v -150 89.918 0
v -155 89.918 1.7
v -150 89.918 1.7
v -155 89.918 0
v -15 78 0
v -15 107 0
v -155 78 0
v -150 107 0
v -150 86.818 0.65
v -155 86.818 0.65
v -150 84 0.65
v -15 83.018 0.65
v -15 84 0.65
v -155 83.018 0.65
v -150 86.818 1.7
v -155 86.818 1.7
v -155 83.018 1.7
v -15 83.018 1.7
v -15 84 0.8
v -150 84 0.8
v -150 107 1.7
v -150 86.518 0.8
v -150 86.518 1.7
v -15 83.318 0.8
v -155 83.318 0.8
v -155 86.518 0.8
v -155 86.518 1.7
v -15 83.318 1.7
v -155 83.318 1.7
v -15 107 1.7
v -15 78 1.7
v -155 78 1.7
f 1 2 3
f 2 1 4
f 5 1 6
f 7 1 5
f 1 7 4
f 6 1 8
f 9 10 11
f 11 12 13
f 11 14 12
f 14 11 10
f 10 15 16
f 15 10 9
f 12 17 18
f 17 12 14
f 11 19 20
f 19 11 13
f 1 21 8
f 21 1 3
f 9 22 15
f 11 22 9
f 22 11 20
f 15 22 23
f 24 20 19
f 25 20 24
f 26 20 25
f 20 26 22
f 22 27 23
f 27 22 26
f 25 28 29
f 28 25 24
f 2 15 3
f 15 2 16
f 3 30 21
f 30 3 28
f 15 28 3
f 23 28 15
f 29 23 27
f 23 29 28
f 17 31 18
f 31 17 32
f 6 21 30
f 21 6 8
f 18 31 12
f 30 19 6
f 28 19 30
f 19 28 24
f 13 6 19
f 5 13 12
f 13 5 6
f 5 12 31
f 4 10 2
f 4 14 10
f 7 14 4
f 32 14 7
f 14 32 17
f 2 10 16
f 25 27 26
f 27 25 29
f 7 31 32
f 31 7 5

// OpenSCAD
// file: ../../lib/project/util.scad
// lib/project/util.scad

module rounded_rect_2d(size = [10, 10], r = 2) {
  x = size[0];
  y = size[1];
  rr = min(r, min(x, y) / 2);

  hull() {
    for (sx = [-1, 1], sy = [-1, 1]) {
      translate([sx * (x / 2 - rr), sy * (y / 2 - rr)])
        circle(r = rr);
    }
  }
}
// file: ../../lib/project/params.scad
// lib/project/params.scad
// Shared project parameters for the final tray and all fit-test models.

debug = false;

// Main tray footprint.
tray_corner_r = 15;

// Top tray shell.
tray_floor_t = 2.4;
tray_wall_h = 14;
top_wall_w = 10;
glue_rabbet_h = 1.6;
glue_rabbet_w = 3.2;
glue_rabbet_side_clearance = 0.3;
glue_rabbet_vertical_clearance = 0.5;

// Underside support lip and rear support section.
support_lip_drop = 15;
support_lip_w = 10;
front_lip_forward_shift = 2;
front_lip_back_extra = 5;
front_lip_bottom_back_extra = 0;
side_lip_inner_extra = 2.5;
side_lip_bottom_inner_extra = 0;
console_clear_w = 320;
side_lip_run = 170;
tray_w = console_clear_w + 2 * support_lip_w;
tray_d = side_lip_run + support_lip_w;
front_extension = 35;
rear_gap_w = 28;
rear_tongue_side_margin = 20;
rear_tongue_w = tray_w - 2 * rear_tongue_side_margin;
rear_tongue_depth = 34;
rear_tongue_t = 4.0;

// Cup holder location and plug geometry.
cup_spacing = 135;
// Confirmed from fit checks: move plugs 39 mm rearward from the prior position.
cup_y_from_front = 111;
plug_top_d = 90;
plug_bottom_d = 78;
plug_h = 71;
plug_shell_t = 1.6;
plug_clearance_z = 0;
cup_rim_w = 7;
cup_rim_h = 5;

// Optional underside splice plate for joining printed tray halves.
splice_plate_enable = true;
splice_plate_w = 120;
splice_plate_d = 18;
splice_plate_t = 2;
splice_plate_corner_r = 3;
splice_plate_y_from_front = 40;
splice_plate_side_clearance = 0.3;
splice_plate_vertical_clearance = 0.5;
rear_splice_plate_enable = true;
rear_splice_plate_y_from_front = 184;

// Fit-test defaults.
test_plug_top_ds = [84, 85, 86];
test_spacing_values = [116, 118, 120];
test_lip_drop_values = [8, 10, 12];
test_rear_tongue_ts = [1.4, 1.8, 2.2];
test_frame_wall_w = 12;
test_front_zone_depth = 100;
test_rear_zone_depth = 56;
test_gap_section_w = 140;
test_coupon_spacing = 18;
test_front_to_back_slice_w = 10;
test_side_to_side_slice_w = 10;
test_rabbet_corner_section_size = 56;
test_rabbet_coupon_gap = 16;
test_rabbet_body_margin_from_groove = 15;
// main file
use <../../lib/project/console_tray.scad>;
include <../../lib/project/params.scad>;

back_gap_fit_variant(
  tray_w = tray_w,
  tray_d = tray_d,
  front_extension = front_extension,
  tray_corner_r = tray_corner_r,
  tray_floor_t = tray_floor_t,
  tray_wall_h = tray_wall_h,
  top_wall_w = top_wall_w,
  support_lip_drop = support_lip_drop,
  support_lip_w = support_lip_w,
  front_lip_forward_shift = front_lip_forward_shift,
  front_lip_back_extra = front_lip_back_extra,
  front_lip_bottom_back_extra = front_lip_bottom_back_extra,
  side_lip_inner_extra = side_lip_inner_extra,
  side_lip_bottom_inner_extra = side_lip_bottom_inner_extra,
  rear_gap_w = rear_gap_w,
  rear_tongue_w = rear_tongue_w,
  rear_tongue_depth = rear_tongue_depth,
  rear_tongue_t = rear_tongue_t,
  section_w = test_gap_section_w
);
